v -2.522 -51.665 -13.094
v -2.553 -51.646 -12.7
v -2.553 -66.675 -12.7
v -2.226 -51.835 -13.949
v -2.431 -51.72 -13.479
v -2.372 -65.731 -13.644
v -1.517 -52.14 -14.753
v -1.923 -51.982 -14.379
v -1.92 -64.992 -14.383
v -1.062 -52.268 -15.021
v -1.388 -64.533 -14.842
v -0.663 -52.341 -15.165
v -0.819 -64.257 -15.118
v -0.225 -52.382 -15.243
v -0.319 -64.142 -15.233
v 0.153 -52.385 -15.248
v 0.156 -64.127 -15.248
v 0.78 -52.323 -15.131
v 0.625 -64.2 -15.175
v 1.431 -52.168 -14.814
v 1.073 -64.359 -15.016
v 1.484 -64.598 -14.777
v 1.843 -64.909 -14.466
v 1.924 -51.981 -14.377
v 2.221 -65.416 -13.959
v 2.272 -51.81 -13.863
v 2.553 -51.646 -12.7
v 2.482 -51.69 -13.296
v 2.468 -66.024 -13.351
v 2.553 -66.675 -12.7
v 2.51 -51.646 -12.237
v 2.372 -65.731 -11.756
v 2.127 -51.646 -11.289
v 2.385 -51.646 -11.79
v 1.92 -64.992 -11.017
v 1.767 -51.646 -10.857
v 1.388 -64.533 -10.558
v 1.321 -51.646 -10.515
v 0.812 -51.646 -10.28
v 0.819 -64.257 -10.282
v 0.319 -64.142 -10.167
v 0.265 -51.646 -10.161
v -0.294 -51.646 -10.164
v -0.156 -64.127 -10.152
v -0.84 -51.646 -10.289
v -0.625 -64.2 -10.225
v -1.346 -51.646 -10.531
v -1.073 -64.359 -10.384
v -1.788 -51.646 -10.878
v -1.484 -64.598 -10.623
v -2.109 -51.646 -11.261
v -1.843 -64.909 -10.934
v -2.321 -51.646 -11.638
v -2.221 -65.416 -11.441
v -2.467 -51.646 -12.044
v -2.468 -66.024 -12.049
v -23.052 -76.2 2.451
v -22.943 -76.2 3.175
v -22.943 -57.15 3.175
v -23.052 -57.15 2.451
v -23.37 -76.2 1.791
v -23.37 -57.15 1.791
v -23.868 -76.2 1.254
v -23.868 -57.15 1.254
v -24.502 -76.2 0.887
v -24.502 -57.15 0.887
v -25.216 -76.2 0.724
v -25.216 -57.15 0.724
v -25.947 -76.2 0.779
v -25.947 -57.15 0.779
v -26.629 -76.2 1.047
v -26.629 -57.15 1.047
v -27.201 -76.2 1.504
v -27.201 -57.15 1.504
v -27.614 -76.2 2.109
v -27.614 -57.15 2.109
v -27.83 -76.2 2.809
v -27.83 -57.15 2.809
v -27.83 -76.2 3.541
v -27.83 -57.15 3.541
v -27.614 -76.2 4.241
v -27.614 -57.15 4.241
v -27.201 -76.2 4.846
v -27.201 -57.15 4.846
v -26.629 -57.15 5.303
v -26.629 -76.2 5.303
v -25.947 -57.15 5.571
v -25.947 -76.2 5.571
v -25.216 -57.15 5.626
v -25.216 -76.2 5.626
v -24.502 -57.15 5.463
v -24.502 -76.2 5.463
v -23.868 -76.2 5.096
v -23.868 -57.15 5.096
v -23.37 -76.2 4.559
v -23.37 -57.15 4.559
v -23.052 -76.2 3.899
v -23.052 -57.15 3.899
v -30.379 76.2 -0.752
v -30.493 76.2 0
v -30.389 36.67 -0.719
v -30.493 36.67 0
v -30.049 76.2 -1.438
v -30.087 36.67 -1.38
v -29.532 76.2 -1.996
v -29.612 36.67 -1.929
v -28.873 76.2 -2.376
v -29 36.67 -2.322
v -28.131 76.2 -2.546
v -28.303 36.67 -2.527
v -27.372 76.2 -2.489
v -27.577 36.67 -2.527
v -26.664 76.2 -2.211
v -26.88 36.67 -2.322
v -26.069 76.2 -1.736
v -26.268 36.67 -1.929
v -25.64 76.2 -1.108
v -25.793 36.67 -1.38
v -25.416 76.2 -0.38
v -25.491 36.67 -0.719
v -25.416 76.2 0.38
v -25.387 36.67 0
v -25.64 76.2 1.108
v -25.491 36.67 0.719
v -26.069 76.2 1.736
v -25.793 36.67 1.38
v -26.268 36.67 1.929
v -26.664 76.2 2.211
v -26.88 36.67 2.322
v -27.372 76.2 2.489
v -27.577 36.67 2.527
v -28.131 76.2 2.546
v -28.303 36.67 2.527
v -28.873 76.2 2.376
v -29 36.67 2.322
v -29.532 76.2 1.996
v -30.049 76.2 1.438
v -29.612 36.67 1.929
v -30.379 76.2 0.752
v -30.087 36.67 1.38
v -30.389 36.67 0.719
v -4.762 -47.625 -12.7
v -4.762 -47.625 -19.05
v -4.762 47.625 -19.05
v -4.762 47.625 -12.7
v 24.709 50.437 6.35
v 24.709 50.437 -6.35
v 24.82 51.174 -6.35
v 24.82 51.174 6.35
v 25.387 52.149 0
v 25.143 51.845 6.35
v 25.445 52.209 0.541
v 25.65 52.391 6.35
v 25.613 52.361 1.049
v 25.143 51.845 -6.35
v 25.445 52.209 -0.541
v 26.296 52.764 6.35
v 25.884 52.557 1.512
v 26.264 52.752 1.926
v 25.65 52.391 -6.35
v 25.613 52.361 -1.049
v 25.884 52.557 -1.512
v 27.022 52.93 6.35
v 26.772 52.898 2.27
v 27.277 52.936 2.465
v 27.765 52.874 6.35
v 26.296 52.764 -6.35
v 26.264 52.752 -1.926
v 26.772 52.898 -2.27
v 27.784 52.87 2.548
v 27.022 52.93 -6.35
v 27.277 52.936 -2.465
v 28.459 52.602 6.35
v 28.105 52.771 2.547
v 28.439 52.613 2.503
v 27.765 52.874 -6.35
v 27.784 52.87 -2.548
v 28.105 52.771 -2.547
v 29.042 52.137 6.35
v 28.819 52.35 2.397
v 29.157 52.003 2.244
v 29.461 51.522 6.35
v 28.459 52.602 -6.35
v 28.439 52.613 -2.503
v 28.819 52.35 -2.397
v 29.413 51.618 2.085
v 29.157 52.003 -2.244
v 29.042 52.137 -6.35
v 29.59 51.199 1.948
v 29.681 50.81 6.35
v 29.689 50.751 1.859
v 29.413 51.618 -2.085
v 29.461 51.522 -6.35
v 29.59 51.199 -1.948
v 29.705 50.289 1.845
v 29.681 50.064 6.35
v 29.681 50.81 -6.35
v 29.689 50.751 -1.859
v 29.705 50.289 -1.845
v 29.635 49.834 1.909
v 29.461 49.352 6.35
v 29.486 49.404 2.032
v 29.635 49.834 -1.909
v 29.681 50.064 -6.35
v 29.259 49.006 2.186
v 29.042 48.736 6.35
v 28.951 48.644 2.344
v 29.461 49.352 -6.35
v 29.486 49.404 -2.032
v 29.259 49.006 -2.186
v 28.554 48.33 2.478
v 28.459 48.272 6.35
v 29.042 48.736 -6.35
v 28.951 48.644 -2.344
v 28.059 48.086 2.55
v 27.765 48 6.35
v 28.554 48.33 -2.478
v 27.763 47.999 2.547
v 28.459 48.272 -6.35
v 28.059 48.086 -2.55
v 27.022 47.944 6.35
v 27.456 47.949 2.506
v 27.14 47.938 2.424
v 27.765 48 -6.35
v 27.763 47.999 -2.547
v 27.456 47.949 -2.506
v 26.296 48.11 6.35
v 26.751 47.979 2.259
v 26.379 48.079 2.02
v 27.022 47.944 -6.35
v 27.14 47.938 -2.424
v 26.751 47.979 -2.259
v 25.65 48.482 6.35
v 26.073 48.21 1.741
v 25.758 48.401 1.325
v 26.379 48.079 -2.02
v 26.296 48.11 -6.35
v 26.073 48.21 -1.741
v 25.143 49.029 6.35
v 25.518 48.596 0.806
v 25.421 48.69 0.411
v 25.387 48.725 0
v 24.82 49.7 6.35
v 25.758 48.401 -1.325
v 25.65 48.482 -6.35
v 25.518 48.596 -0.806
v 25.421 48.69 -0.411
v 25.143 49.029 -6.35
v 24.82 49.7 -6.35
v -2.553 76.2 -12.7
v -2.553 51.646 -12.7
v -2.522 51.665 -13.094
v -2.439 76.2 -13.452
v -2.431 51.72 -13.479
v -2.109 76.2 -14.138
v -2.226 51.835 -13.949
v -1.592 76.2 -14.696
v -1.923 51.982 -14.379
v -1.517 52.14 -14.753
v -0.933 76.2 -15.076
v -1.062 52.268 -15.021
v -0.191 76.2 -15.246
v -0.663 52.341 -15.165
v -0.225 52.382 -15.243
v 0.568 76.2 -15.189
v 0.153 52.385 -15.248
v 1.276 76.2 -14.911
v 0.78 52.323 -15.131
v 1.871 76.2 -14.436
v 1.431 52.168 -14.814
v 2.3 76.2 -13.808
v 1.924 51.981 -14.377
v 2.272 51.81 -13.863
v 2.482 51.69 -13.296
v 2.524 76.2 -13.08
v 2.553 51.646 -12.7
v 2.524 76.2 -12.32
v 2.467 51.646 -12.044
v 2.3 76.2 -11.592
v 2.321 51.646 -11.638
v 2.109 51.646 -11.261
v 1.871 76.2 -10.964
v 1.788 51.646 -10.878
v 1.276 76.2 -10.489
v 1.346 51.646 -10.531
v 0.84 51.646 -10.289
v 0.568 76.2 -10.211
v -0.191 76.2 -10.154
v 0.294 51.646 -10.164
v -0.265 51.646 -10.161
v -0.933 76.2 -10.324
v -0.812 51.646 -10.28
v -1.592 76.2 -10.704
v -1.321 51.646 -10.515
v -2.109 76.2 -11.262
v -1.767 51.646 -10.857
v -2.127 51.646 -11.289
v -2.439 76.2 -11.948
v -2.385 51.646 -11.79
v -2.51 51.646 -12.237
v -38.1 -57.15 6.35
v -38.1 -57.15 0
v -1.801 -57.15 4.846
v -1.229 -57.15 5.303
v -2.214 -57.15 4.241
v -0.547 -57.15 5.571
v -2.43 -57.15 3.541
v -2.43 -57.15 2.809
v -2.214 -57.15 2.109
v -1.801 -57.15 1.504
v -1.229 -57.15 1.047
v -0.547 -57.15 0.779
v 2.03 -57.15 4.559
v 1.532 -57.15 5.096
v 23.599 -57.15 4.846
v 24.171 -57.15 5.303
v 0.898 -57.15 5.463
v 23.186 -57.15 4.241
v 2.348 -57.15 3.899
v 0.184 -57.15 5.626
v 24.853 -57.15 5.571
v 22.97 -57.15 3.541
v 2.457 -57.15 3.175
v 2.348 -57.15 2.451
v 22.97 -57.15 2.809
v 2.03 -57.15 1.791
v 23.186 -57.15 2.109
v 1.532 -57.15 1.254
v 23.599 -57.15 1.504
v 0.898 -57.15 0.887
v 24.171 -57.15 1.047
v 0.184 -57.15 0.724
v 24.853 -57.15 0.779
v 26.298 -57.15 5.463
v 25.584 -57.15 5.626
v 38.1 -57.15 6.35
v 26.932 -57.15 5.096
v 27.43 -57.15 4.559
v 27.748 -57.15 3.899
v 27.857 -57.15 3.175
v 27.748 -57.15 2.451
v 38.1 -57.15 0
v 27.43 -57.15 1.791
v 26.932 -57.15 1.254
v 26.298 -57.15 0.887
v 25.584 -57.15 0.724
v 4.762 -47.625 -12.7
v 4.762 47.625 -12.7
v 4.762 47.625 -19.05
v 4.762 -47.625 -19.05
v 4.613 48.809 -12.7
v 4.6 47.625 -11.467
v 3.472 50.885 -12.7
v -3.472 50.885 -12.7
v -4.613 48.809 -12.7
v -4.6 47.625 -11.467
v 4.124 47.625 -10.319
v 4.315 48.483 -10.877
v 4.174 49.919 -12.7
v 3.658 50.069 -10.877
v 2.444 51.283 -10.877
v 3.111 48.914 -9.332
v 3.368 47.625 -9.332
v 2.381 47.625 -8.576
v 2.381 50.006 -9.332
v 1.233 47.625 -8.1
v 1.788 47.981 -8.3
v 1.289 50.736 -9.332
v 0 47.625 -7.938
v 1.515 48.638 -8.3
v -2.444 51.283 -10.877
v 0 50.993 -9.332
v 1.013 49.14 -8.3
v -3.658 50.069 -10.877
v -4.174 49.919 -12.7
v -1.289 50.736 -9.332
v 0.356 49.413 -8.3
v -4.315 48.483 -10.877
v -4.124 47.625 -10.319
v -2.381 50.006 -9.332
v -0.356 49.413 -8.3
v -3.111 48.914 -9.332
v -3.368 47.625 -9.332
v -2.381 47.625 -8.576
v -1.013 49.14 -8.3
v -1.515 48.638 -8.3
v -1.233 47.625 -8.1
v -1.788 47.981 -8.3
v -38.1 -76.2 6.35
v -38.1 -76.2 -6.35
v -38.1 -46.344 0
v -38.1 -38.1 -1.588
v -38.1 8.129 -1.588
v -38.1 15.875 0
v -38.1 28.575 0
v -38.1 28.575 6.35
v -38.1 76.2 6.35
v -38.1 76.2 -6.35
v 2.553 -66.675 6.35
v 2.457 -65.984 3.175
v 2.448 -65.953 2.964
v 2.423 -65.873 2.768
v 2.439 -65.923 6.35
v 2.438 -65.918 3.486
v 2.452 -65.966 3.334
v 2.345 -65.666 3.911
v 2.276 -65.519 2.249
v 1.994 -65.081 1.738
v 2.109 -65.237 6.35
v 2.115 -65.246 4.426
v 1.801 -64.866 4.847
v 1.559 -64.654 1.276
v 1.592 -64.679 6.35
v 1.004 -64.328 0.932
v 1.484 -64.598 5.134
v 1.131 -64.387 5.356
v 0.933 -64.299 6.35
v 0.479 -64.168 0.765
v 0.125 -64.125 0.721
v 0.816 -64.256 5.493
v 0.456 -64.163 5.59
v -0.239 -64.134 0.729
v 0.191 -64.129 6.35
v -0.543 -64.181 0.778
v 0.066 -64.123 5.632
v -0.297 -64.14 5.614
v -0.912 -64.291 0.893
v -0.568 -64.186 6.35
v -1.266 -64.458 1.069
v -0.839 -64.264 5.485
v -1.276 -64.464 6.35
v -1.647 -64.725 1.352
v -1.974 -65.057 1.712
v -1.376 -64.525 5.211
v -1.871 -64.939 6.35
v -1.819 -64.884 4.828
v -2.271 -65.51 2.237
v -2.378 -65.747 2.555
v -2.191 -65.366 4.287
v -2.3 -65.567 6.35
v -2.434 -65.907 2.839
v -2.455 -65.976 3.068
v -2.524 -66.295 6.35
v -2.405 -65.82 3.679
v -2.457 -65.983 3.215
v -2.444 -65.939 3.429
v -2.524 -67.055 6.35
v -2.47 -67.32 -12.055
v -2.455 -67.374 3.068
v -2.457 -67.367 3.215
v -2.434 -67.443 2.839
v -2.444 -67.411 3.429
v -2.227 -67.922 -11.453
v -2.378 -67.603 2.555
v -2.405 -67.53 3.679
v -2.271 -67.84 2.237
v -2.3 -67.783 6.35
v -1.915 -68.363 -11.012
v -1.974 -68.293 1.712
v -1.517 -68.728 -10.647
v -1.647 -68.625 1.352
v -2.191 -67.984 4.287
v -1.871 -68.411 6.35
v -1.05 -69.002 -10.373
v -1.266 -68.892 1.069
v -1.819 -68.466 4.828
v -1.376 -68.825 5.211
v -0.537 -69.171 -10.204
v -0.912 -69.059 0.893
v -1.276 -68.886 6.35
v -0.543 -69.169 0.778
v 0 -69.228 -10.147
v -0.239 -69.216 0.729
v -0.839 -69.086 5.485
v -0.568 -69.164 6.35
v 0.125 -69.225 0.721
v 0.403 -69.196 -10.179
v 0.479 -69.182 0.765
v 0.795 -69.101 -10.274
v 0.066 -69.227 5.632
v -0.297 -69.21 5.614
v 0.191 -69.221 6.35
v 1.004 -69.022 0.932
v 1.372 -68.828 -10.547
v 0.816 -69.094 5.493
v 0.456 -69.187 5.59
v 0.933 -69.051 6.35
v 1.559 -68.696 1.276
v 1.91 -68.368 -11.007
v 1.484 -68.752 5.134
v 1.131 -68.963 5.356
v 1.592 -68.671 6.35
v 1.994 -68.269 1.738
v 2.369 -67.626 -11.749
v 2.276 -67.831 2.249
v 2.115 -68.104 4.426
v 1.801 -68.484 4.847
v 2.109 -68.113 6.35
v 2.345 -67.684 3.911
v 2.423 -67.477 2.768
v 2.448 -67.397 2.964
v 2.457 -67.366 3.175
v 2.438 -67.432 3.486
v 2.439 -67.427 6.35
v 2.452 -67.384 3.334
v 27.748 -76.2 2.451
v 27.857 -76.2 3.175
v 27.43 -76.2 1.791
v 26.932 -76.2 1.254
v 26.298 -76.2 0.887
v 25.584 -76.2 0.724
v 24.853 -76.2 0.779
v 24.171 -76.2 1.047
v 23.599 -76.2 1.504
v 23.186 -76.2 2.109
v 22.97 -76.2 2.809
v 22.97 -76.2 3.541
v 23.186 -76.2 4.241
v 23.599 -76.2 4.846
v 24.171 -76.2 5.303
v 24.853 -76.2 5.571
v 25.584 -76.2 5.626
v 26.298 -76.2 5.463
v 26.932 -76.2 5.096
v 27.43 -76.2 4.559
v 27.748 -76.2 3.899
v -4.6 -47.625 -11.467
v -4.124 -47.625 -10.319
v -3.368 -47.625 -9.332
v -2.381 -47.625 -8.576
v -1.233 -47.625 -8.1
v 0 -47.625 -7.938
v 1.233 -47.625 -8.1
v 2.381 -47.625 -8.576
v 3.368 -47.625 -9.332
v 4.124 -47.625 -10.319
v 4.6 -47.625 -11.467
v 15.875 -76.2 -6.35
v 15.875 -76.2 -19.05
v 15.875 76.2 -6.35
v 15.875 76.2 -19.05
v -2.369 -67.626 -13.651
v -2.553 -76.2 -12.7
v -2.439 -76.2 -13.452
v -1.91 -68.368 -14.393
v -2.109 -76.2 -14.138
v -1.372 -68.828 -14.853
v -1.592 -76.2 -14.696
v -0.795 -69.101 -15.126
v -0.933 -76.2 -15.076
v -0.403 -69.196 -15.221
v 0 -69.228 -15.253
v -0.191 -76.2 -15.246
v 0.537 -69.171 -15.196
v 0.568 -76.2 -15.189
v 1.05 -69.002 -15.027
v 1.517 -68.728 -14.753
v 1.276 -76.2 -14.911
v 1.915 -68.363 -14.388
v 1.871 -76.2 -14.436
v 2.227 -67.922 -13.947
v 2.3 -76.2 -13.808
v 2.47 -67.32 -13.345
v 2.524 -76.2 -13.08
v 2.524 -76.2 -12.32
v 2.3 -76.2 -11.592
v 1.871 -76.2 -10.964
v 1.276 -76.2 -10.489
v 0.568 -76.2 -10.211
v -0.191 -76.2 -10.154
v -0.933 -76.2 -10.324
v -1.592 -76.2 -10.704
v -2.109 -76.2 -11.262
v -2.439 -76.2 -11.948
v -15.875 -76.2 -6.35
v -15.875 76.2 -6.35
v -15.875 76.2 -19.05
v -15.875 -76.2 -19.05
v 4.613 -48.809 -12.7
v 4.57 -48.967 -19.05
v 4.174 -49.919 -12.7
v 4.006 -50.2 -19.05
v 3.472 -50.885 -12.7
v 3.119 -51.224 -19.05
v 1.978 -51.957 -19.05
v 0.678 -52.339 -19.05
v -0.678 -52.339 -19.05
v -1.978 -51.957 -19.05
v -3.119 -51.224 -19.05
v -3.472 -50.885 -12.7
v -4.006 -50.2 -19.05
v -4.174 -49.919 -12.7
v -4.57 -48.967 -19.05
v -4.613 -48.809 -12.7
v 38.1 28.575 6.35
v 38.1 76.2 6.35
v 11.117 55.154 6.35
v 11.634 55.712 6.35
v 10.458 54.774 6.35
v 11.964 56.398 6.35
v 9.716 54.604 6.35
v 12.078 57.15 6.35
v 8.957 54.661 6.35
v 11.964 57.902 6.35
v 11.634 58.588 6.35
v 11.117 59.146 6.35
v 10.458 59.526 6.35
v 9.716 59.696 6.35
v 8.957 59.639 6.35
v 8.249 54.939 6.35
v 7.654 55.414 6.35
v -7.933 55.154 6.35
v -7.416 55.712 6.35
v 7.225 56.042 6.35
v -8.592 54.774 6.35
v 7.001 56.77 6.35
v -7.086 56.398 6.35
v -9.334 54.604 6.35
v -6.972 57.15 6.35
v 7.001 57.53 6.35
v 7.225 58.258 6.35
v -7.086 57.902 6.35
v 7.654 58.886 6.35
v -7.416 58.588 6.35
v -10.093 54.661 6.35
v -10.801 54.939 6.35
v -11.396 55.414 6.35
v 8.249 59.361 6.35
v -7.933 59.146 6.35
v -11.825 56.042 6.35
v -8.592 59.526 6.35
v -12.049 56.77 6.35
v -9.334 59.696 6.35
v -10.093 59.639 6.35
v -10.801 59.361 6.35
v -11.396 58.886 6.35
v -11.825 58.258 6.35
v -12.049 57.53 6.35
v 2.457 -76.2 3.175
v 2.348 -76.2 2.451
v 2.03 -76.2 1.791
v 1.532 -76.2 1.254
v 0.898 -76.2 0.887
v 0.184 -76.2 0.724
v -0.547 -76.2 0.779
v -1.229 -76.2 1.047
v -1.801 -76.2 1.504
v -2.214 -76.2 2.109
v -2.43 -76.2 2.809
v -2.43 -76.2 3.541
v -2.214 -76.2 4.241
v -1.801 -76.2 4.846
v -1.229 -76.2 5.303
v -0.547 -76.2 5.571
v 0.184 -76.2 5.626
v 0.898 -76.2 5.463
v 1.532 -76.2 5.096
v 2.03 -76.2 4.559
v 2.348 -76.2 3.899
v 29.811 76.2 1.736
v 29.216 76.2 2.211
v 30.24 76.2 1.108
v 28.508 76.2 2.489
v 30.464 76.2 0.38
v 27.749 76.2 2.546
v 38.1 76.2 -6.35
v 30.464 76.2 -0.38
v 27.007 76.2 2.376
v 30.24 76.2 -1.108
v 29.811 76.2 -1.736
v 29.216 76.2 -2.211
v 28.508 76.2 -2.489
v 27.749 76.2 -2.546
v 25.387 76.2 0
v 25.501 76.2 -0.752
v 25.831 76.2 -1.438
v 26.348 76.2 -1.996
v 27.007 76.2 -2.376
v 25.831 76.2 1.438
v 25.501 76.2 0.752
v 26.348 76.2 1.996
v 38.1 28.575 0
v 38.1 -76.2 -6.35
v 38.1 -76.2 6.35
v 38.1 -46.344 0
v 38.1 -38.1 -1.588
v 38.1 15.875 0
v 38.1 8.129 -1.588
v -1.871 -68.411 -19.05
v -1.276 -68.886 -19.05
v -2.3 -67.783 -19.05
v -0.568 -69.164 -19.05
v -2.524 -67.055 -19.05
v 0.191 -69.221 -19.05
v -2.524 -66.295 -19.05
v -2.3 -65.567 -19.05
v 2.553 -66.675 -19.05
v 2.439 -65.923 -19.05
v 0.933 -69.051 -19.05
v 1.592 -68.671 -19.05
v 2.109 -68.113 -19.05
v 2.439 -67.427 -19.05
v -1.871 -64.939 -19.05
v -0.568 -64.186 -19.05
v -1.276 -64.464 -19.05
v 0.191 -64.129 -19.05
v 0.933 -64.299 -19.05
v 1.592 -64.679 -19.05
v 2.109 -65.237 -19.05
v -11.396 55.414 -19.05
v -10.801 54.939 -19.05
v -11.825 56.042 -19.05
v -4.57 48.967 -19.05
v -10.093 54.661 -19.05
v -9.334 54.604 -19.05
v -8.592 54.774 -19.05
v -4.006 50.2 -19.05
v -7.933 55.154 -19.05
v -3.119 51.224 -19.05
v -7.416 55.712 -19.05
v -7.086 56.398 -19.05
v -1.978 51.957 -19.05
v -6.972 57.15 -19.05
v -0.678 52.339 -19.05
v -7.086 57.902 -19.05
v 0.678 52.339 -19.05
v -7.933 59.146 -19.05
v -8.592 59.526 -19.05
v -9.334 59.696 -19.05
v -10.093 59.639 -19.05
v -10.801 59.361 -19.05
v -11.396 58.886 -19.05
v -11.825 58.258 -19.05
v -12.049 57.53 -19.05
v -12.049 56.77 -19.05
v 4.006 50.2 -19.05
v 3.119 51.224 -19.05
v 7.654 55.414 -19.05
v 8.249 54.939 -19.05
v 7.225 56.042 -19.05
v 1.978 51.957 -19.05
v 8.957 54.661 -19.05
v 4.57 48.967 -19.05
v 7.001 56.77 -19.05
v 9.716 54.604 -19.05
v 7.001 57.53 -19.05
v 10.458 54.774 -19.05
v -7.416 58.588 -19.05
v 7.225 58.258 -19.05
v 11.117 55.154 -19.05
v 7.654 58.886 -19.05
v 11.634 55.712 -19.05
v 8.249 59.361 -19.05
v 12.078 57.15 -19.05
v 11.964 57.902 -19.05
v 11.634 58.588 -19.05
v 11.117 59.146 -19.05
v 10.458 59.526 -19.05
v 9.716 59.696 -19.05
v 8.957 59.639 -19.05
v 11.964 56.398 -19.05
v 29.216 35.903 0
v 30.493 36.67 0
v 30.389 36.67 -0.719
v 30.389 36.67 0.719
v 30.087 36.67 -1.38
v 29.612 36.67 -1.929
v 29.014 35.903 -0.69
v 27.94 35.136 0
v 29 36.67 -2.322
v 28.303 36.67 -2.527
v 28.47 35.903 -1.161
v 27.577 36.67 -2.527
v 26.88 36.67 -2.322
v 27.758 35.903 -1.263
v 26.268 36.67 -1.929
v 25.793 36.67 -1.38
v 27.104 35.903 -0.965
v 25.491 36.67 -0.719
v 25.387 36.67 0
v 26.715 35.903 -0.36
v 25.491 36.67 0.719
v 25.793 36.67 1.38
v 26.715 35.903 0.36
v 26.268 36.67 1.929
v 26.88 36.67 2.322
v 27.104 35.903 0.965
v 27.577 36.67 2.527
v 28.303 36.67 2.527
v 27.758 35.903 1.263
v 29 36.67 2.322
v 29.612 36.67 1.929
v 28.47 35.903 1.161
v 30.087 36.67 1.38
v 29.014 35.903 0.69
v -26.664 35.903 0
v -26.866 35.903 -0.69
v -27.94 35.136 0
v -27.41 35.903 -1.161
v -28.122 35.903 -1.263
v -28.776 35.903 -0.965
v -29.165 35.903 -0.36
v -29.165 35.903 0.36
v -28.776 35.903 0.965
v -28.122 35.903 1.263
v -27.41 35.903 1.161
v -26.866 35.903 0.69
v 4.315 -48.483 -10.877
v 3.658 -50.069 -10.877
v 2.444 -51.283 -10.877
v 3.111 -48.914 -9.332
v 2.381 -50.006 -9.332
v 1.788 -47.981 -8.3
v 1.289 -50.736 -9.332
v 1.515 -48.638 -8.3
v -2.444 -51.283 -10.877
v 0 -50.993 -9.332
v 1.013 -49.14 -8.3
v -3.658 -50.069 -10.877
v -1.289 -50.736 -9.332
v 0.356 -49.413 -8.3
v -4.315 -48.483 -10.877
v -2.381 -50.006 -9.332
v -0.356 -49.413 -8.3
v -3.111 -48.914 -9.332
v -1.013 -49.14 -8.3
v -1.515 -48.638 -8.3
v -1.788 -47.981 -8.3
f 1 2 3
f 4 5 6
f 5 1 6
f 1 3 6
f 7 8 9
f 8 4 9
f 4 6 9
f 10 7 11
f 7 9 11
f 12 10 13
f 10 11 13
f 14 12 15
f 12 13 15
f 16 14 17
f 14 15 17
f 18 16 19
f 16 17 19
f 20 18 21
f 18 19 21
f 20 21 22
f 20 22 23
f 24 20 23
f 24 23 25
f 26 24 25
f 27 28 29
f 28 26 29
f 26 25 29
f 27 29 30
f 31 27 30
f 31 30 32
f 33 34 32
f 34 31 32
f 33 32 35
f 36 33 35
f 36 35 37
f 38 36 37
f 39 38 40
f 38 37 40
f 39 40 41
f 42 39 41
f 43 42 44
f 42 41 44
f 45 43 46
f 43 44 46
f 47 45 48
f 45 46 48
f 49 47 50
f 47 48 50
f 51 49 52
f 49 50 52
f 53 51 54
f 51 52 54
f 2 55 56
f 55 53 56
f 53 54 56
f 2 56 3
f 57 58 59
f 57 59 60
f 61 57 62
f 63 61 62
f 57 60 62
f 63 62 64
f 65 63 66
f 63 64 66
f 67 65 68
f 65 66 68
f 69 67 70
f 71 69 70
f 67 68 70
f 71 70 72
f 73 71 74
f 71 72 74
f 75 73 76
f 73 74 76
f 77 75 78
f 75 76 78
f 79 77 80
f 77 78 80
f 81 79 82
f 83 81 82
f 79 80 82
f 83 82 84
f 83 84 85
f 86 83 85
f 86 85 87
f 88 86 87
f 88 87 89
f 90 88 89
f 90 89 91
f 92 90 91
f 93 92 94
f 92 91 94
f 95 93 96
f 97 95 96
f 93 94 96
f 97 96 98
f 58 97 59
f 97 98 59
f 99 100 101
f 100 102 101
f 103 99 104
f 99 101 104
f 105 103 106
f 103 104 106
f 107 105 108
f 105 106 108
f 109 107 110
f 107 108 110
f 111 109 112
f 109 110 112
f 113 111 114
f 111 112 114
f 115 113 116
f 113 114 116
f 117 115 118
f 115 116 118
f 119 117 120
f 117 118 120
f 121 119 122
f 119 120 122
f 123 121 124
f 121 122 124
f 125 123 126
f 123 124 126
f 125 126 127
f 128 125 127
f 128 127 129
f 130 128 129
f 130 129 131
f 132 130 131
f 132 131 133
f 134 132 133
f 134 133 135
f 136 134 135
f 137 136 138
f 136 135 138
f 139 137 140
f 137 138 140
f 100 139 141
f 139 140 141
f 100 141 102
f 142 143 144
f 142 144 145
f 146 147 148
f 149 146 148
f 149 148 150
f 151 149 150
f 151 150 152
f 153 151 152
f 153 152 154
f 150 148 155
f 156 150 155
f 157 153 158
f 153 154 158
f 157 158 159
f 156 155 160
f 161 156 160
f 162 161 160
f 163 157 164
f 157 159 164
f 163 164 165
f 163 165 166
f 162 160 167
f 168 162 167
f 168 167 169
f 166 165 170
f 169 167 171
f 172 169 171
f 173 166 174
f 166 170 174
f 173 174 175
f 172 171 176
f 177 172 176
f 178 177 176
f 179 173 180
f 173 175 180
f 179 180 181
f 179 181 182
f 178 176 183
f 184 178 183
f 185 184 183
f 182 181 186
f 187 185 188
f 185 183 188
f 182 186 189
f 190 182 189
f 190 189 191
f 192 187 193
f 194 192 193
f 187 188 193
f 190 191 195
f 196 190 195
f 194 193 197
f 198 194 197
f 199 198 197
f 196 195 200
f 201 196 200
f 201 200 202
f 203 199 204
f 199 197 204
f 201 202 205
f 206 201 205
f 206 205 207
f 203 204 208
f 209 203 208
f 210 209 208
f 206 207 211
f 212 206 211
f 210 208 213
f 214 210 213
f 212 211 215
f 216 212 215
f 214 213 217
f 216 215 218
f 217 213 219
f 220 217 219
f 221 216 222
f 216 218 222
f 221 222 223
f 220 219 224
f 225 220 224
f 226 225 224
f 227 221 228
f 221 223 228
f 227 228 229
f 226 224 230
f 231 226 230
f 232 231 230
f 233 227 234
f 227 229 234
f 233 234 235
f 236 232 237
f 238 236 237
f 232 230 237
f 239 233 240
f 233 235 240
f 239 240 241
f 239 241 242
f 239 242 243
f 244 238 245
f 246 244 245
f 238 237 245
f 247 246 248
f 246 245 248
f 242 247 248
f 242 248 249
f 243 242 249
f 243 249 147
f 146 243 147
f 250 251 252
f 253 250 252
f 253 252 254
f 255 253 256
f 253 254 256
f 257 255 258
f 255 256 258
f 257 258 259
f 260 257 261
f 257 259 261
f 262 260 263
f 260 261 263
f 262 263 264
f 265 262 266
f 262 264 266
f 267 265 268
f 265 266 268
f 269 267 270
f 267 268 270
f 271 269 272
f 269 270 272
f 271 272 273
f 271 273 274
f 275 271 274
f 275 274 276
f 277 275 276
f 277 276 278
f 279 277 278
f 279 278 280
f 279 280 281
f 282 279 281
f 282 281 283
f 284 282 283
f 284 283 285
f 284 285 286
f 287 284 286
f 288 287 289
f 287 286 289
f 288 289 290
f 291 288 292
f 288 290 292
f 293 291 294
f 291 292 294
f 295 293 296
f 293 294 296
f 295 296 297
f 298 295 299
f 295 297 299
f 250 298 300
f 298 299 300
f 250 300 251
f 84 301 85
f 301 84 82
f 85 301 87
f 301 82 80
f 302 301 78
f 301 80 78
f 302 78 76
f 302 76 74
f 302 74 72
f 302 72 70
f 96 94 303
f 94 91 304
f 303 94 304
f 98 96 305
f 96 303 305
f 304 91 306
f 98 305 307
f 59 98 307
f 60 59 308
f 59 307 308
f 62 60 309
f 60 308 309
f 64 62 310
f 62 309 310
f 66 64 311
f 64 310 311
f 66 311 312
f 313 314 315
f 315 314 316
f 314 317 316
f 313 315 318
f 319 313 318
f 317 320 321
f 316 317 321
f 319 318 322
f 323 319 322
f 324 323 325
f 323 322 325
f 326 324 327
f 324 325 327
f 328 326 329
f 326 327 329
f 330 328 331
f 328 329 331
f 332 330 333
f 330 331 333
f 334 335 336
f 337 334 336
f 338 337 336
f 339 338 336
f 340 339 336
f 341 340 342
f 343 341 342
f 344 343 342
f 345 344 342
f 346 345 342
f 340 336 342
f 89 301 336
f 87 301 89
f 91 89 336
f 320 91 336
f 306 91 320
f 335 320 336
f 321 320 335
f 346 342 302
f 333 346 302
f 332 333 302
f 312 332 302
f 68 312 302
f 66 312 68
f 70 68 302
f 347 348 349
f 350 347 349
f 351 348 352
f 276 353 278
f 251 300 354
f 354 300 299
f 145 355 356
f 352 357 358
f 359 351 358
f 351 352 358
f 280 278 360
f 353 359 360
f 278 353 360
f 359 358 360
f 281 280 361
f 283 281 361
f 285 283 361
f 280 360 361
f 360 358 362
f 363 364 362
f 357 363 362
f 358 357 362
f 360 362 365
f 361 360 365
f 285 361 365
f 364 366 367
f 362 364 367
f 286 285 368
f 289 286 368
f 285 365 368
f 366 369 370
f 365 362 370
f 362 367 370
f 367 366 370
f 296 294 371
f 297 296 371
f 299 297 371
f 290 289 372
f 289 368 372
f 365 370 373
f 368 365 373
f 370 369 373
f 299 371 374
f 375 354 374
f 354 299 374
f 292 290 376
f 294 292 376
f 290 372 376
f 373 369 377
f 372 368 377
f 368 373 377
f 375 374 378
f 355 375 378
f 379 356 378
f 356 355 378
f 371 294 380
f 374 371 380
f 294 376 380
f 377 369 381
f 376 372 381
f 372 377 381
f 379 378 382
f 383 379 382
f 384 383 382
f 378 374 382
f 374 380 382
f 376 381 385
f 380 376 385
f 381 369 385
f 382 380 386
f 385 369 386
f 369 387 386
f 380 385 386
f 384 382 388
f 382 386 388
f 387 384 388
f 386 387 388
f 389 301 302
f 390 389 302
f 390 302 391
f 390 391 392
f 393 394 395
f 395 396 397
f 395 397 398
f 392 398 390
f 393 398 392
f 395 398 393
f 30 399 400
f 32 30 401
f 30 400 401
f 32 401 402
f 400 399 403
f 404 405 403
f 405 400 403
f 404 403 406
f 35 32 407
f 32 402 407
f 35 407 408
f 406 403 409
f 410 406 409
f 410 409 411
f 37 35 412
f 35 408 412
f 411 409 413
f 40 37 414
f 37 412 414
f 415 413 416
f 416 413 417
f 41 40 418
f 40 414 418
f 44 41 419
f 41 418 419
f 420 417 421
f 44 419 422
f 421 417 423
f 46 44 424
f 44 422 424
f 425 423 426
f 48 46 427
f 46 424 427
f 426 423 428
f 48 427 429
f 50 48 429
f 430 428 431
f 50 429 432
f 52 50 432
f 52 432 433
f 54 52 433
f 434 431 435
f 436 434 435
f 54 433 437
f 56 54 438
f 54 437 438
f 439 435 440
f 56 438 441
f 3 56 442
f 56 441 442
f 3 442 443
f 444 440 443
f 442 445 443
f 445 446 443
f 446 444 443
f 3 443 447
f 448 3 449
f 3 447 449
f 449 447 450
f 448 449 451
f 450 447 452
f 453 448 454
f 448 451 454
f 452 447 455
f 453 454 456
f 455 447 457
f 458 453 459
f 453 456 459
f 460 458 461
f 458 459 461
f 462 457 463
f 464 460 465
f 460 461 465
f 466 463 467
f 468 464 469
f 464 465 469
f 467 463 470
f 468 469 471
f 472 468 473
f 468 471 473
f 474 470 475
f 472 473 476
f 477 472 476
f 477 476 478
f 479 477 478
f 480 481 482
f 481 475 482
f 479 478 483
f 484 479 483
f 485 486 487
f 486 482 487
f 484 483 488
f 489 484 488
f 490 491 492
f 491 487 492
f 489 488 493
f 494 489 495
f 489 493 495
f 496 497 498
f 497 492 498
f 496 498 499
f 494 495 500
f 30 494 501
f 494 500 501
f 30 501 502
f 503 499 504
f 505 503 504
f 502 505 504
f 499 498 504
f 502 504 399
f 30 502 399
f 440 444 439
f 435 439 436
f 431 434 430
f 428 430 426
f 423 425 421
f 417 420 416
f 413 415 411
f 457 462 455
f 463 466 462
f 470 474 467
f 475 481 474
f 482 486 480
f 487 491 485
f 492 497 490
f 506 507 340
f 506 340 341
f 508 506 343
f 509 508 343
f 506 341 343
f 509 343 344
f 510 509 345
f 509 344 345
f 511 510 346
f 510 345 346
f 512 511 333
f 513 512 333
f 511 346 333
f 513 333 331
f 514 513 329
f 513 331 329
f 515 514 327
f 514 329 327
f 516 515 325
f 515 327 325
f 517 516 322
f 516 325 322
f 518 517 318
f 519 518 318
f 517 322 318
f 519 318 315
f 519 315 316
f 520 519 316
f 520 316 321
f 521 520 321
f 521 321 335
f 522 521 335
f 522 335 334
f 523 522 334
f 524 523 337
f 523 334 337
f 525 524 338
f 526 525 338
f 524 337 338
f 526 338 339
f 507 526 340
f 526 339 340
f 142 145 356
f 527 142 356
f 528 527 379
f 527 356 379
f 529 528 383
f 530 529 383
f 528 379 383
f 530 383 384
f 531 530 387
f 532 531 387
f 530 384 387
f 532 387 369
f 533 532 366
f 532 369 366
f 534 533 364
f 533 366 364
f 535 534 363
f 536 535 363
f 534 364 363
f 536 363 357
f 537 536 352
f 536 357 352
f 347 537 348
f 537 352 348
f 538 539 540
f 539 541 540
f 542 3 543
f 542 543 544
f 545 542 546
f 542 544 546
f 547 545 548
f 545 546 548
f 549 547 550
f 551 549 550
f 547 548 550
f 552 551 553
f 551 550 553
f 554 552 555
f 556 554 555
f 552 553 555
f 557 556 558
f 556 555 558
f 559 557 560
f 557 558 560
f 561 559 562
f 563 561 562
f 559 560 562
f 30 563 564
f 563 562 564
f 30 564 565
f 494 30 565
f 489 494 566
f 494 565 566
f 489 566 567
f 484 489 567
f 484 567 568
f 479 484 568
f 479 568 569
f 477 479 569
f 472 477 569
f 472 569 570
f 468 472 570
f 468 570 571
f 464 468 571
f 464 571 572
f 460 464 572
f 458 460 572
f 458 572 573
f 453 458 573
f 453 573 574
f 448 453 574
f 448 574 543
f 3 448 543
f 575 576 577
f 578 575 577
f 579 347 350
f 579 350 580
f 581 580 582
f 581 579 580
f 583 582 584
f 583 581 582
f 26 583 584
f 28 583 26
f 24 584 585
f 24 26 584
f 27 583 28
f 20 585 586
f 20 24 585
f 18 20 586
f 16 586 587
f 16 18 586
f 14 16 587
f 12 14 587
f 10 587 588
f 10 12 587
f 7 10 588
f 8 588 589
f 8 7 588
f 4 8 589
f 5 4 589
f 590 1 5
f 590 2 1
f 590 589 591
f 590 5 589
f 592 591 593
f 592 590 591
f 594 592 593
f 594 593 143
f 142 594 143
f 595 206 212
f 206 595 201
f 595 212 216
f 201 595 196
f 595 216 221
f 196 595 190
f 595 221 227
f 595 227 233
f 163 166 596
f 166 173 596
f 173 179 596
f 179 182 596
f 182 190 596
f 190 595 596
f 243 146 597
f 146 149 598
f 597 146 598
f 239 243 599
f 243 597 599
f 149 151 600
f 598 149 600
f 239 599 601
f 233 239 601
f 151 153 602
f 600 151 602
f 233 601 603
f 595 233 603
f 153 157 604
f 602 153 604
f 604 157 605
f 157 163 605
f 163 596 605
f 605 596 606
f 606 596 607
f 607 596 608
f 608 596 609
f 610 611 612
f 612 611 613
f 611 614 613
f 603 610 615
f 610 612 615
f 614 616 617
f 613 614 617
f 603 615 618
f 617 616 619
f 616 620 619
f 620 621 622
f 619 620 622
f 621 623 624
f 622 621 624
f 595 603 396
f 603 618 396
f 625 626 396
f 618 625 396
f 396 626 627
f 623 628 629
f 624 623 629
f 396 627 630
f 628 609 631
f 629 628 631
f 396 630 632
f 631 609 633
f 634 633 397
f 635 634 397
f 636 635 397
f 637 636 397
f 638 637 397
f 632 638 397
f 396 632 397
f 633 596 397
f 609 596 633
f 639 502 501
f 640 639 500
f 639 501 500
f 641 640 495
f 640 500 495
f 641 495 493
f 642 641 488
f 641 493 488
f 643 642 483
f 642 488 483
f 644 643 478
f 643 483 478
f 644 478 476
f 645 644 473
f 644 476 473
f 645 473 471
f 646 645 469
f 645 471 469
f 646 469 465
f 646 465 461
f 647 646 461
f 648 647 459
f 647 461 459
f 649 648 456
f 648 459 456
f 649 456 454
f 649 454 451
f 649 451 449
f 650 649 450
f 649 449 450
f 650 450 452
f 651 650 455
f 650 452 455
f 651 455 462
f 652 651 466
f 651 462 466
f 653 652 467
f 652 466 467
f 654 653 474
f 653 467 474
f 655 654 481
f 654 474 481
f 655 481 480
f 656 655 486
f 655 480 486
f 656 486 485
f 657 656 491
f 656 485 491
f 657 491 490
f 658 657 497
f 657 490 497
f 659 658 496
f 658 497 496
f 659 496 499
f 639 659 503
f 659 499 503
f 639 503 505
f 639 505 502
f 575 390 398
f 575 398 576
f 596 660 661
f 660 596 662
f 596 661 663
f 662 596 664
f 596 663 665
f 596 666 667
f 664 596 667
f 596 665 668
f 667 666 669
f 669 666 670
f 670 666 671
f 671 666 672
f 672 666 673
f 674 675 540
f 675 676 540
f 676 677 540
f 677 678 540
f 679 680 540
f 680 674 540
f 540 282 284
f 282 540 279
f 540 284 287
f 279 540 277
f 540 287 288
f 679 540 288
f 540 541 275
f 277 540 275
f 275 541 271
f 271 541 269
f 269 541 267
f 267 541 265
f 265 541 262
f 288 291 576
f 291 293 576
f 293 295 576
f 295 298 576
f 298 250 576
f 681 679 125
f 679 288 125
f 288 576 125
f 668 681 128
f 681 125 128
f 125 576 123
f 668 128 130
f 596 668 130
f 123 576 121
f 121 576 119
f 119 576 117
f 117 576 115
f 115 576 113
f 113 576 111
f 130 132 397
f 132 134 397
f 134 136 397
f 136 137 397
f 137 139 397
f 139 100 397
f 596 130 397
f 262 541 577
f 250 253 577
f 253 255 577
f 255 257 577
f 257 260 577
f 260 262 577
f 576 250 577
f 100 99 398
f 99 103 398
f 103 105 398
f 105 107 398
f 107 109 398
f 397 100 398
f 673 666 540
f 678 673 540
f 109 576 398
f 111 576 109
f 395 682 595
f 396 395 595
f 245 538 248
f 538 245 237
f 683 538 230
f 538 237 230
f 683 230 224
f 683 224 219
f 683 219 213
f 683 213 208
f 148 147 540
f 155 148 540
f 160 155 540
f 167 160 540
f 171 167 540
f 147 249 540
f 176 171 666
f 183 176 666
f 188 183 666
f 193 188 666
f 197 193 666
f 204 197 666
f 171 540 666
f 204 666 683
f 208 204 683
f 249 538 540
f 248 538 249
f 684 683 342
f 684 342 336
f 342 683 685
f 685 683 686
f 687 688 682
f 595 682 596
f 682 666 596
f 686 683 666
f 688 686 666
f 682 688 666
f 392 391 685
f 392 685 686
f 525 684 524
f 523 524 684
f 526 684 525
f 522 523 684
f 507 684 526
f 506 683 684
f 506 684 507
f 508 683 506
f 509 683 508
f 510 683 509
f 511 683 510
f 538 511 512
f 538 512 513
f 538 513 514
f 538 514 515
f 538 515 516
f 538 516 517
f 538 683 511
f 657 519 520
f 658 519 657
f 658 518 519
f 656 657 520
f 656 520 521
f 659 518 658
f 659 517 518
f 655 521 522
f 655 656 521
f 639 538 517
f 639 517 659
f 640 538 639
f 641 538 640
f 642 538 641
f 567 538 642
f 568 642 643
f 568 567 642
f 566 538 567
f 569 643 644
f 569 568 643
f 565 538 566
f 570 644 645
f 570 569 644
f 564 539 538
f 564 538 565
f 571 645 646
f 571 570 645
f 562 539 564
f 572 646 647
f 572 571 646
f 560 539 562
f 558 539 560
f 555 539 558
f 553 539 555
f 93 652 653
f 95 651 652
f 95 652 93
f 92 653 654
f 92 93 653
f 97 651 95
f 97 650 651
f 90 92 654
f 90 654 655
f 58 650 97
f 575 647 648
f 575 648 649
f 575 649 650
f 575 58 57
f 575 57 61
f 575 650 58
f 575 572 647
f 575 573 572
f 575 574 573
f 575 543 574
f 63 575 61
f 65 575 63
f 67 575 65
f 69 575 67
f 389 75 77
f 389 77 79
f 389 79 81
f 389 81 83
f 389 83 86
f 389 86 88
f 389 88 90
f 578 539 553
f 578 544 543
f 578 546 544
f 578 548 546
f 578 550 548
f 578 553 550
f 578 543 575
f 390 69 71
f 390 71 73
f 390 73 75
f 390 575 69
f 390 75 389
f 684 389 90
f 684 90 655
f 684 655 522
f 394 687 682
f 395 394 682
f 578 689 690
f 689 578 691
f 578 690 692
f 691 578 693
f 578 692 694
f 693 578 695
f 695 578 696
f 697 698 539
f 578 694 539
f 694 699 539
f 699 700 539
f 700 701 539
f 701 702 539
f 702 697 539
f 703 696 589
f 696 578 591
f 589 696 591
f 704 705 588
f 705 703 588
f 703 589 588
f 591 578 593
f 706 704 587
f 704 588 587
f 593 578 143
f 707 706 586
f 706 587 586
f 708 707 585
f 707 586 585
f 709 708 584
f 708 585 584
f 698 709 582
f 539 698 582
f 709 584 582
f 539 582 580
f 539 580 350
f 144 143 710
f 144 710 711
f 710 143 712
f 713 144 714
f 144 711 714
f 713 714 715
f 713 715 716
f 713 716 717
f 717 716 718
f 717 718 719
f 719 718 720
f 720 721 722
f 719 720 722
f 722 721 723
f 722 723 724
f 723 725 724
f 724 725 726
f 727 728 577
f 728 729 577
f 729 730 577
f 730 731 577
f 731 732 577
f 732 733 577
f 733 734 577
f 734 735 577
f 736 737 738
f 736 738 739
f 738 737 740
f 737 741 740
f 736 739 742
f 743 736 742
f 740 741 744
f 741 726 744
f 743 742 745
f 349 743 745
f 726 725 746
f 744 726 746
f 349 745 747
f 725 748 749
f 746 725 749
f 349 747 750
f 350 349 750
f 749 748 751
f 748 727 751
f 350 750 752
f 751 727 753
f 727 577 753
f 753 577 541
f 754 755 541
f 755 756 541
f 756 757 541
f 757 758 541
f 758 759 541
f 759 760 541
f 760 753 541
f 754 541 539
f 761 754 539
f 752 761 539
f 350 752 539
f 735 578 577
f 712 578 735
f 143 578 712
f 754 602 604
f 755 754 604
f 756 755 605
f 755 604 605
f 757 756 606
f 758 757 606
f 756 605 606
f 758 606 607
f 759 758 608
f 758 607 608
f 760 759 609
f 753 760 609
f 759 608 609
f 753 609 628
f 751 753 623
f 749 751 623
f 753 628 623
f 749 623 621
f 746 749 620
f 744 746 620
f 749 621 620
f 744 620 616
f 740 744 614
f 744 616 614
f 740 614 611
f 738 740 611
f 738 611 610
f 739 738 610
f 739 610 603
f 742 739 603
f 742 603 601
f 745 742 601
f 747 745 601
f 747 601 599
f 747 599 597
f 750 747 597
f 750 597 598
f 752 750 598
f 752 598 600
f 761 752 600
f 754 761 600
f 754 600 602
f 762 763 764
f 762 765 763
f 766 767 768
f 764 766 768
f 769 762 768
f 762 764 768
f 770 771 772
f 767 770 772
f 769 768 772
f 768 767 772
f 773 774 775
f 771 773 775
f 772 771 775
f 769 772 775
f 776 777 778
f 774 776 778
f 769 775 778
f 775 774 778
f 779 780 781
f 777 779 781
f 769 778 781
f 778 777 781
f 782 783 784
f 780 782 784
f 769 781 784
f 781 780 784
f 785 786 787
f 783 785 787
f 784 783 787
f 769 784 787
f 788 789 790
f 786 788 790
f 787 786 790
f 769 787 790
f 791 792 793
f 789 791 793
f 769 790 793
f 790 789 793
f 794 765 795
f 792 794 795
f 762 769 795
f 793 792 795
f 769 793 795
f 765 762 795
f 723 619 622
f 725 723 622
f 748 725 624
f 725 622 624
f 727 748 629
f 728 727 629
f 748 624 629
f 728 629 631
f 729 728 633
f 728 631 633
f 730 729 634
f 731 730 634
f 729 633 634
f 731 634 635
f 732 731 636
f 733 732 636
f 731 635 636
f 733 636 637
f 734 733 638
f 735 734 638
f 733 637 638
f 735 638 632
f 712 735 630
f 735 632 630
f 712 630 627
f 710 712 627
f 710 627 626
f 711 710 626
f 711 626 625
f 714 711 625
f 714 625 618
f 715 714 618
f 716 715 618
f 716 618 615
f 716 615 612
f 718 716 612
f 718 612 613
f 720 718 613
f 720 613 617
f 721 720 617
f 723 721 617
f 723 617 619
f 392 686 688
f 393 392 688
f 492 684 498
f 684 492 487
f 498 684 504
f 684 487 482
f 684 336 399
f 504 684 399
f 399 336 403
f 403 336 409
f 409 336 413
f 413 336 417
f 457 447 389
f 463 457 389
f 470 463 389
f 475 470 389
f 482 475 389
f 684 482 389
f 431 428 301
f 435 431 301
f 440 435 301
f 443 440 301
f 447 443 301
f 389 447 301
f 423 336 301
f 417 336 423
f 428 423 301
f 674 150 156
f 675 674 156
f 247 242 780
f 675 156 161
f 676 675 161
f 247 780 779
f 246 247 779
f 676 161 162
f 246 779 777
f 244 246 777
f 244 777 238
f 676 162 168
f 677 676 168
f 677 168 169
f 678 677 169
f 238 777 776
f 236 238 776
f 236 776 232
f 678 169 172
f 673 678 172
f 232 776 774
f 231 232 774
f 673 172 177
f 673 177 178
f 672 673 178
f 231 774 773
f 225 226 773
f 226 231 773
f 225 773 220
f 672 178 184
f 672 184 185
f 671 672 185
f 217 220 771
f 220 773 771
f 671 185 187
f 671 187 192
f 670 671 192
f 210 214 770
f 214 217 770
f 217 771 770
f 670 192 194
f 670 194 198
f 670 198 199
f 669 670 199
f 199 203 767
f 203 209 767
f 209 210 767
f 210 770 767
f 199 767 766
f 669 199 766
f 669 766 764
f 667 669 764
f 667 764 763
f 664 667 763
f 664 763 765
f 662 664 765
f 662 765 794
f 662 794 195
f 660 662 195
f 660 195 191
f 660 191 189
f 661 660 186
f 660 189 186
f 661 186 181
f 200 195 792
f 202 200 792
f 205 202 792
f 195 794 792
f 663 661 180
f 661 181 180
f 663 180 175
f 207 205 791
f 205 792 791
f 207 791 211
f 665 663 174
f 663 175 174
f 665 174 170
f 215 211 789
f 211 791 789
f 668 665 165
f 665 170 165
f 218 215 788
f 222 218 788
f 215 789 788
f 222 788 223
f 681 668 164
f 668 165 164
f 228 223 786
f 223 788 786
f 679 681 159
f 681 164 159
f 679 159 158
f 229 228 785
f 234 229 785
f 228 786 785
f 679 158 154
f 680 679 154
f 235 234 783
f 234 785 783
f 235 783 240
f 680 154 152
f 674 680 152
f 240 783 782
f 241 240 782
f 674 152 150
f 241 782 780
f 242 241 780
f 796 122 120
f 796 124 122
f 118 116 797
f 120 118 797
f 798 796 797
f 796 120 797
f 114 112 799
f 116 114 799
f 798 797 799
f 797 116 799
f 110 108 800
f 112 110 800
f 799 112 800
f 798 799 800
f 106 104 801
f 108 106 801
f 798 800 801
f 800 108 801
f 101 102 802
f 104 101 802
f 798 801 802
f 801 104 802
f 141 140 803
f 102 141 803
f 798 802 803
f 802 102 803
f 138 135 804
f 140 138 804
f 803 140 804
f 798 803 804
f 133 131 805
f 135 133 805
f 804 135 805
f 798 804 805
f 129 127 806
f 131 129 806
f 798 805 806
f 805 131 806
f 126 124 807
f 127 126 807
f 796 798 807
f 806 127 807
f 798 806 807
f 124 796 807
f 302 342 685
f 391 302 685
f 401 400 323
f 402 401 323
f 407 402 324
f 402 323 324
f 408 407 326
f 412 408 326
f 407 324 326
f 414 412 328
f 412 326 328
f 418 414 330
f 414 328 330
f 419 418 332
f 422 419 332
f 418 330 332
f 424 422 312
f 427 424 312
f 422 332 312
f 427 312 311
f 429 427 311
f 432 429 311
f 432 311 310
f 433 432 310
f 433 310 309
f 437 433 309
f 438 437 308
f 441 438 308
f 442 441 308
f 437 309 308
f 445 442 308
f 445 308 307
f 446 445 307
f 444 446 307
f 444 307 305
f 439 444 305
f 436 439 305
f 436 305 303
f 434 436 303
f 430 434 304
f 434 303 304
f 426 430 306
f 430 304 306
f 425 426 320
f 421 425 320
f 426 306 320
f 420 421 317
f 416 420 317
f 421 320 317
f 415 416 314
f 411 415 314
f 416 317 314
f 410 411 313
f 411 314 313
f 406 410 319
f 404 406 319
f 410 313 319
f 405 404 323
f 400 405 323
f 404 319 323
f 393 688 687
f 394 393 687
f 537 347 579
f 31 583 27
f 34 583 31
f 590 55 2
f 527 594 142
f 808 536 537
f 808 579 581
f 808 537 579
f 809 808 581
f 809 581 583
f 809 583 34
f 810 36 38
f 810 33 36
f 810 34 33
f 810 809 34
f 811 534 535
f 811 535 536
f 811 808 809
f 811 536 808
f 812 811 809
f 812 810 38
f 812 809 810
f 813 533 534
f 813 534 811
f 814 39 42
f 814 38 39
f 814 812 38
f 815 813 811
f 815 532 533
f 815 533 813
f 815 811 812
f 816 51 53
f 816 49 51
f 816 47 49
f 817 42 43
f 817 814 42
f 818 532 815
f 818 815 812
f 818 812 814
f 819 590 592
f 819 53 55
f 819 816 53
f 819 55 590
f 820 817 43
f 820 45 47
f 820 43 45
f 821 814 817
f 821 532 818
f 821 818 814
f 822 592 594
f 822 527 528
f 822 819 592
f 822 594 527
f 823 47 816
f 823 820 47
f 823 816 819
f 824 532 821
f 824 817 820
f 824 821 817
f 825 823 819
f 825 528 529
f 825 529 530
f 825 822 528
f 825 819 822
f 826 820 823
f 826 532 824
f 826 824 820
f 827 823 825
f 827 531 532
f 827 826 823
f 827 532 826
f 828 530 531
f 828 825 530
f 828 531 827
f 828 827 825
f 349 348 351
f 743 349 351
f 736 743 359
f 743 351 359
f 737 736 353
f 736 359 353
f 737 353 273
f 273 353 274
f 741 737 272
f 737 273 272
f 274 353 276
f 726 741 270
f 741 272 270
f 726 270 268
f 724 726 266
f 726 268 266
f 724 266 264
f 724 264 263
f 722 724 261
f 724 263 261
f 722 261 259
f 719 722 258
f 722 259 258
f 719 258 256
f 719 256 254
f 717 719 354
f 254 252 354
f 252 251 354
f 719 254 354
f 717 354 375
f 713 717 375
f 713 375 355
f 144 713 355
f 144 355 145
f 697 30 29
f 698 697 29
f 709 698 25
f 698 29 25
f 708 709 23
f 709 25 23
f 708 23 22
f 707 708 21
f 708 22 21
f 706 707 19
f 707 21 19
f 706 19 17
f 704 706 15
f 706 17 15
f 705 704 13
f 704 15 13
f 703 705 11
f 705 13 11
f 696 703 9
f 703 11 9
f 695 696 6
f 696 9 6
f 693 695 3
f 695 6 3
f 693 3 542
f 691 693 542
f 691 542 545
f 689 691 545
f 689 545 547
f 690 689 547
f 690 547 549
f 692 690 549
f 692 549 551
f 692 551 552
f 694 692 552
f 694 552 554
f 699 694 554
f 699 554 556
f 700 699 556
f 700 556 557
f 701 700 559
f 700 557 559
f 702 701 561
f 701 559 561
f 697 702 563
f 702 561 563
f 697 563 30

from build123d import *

# Parameters (mm, degrees)
BOSS_EXTRUDE1_DEPTH              = 76.2
CUT_EXTRUDE3_DEPTH               = 47.625
CUT_EXTRUDE4_DEPTH               = 110.433918417
F_10_0_1935_DIAMETER_HOLE1_D     = 4.9149
F_10_0_1935_DIAMETER_HOLE1_DEPTH = 19.05
F_10_0_1935_DIAMETER_HOLE1_TIP   = 1.476584928
F_1_4_20_TAPPED_HOLE1_D          = 5.1054
SKETCH19_R                       = 2.499999953
CUT_EXTRUDE5_DEPTH               = 87.135590889
F_1_4_20_TAPPED_HOLE2_D          = 5.1054
F_1_4_20_TAPPED_HOLE2_DEPTH      = 39.53002
F_1_4_20_TAPPED_HOLE2_TIP        = 1.533816902
F_1_4_20_TAPPED_HOLE3_D          = 5.1054
F_1_4_20_TAPPED_HOLE3_DEPTH      = 42.07002
F_1_4_20_TAPPED_HOLE3_TIP        = 1.533816902


with BuildPart() as part:
    # Sketch1 → Boss-Extrude1 (new, symmetric)
    with BuildSketch(Plane(origin=(0, 0, 0), x_dir=(1, 0, 0), z_dir=(0, 1, 0))):
        Polygon((-15.875, 6.35), (-15.875, 19.05), (15.875, 19.05), (15.875, 6.35), (38.1, 6.35), (38.1, -6.35), (-38.1, -6.35), (-38.1, 6.35), align=None)
    extrude(amount=BOSS_EXTRUDE1_DEPTH, both=True)

    # Sketch5 → Cut-Extrude3 (cut, symmetric)
    with BuildSketch(Plane(origin=(0, 0, 0), x_dir=(1, 0, 0), z_dir=(0, 1, 0))):
        with BuildLine():
            Line((-4.7625, 19.05), (-4.7625, 12.7))
            ThreePointArc((-4.7625, 12.7), (0, 7.9375), (4.7625, 12.7))
            Line((4.7625, 12.7), (4.7625, 19.05))
            Line((4.7625, 19.05), (-4.7625, 19.05))
        make_face()
    extrude(amount=CUT_EXTRUDE3_DEPTH, both=True, mode=Mode.SUBTRACT)

    # Sketch9 → Cut-Revolve1 (revolve, cut)
    with BuildSketch(Plane(origin=(0, 0, 0), x_dir=(0, 0, -1), z_dir=(1, 0, 0))):
        with BuildLine():
            Line((19.05, -52.3875), (12.7, -52.3875))
            ThreePointArc((12.7, -52.3875), (9.332403955, -50.992596045), (7.9375, -47.625))
            Line((7.9375, -47.625), (19.05, -47.625))
            Line((19.05, -47.625), (19.05, -52.3875))
        make_face()
    cut_revolve1 = revolve(axis=Axis((0, -47.625, -7.9375), (0, 0, -1)), mode=Mode.SUBTRACT)

    # Mirror1: Cut-Revolve1 across plane
    add(cut_revolve1.mirror(Plane.ZX), mode=Mode.SUBTRACT)

    # Sketch12 → Cut-Extrude4 (cut, through all)
    with BuildSketch(Plane(origin=(38.1, 0, 0), x_dir=(0, 0, -1), z_dir=(1, 0, 0))):
        Polygon((-6.35, -57.15), (0, -57.15), (0, -46.343697859), (1.5875, -38.1), (1.5875, 8.129025313), (0, 15.875), (0, 28.575), (-6.35, 28.575), align=None)
    extrude(amount=-CUT_EXTRUDE4_DEPTH, mode=Mode.SUBTRACT)

    # #10 (0.1935) Diameter Hole1
    with Locations(Plane(origin=(0, -76.2, 0), x_dir=(-1, 0, 0), z_dir=(0, -1, 0))):
        with Locations((25.4, -3.175), (-25.4, -3.175), (0, -3.175)):
            Hole(F_10_0_1935_DIAMETER_HOLE1_D / 2, depth=F_10_0_1935_DIAMETER_HOLE1_DEPTH)
            with Locations((0, 0, -(F_10_0_1935_DIAMETER_HOLE1_DEPTH + F_10_0_1935_DIAMETER_HOLE1_TIP / 2))):  # 118° drill point
                Cone(0, F_10_0_1935_DIAMETER_HOLE1_D / 2, F_10_0_1935_DIAMETER_HOLE1_TIP, mode=Mode.SUBTRACT)

    # 1/4-20 Tapped Hole1 (through all)
    with Locations(Plane(origin=(0, 76.2, 0), x_dir=(1, 0, 0), z_dir=(0, 1, 0))):
        with Locations((0, 12.7)):
            Hole(F_1_4_20_TAPPED_HOLE1_D / 2)

    # Sketch19 → Cut-Extrude5 (cut, through all)
    with BuildSketch(Plane(origin=(0, 0, -6.35), x_dir=(-1, 0, 0), z_dir=(0, 0, -1))):
        with Locations((-27.209019229, 50.43691079)):
            Circle(SKETCH19_R)
    extrude(amount=-CUT_EXTRUDE5_DEPTH, mode=Mode.SUBTRACT)

    # 1/4-20 Tapped Hole2
    with Locations(Plane(origin=(0, 76.2, 0), x_dir=(1, 0, 0), z_dir=(0, 1, 0))):
        with Locations((27.94, 0), (-27.94, 0)):
            Hole(F_1_4_20_TAPPED_HOLE2_D / 2, depth=F_1_4_20_TAPPED_HOLE2_DEPTH)
            with Locations((0, 0, -(F_1_4_20_TAPPED_HOLE2_DEPTH + F_1_4_20_TAPPED_HOLE2_TIP / 2))):  # 118° drill point
                Cone(0, F_1_4_20_TAPPED_HOLE2_D / 2, F_1_4_20_TAPPED_HOLE2_TIP, mode=Mode.SUBTRACT)

    # 1/4-20 Tapped Hole3
    with Locations(Plane(origin=(0, 0, -19.05), x_dir=(-1, 0, 0), z_dir=(0, 0, -1))):
        with Locations((0, -66.675), (9.525, 57.15), (-9.525, 57.15)):
            Hole(F_1_4_20_TAPPED_HOLE3_D / 2, depth=F_1_4_20_TAPPED_HOLE3_DEPTH)
            with Locations((0, 0, -(F_1_4_20_TAPPED_HOLE3_DEPTH + F_1_4_20_TAPPED_HOLE3_TIP / 2))):  # 118° drill point
                Cone(0, F_1_4_20_TAPPED_HOLE3_D / 2, F_1_4_20_TAPPED_HOLE3_TIP, mode=Mode.SUBTRACT)


solid = part.part
